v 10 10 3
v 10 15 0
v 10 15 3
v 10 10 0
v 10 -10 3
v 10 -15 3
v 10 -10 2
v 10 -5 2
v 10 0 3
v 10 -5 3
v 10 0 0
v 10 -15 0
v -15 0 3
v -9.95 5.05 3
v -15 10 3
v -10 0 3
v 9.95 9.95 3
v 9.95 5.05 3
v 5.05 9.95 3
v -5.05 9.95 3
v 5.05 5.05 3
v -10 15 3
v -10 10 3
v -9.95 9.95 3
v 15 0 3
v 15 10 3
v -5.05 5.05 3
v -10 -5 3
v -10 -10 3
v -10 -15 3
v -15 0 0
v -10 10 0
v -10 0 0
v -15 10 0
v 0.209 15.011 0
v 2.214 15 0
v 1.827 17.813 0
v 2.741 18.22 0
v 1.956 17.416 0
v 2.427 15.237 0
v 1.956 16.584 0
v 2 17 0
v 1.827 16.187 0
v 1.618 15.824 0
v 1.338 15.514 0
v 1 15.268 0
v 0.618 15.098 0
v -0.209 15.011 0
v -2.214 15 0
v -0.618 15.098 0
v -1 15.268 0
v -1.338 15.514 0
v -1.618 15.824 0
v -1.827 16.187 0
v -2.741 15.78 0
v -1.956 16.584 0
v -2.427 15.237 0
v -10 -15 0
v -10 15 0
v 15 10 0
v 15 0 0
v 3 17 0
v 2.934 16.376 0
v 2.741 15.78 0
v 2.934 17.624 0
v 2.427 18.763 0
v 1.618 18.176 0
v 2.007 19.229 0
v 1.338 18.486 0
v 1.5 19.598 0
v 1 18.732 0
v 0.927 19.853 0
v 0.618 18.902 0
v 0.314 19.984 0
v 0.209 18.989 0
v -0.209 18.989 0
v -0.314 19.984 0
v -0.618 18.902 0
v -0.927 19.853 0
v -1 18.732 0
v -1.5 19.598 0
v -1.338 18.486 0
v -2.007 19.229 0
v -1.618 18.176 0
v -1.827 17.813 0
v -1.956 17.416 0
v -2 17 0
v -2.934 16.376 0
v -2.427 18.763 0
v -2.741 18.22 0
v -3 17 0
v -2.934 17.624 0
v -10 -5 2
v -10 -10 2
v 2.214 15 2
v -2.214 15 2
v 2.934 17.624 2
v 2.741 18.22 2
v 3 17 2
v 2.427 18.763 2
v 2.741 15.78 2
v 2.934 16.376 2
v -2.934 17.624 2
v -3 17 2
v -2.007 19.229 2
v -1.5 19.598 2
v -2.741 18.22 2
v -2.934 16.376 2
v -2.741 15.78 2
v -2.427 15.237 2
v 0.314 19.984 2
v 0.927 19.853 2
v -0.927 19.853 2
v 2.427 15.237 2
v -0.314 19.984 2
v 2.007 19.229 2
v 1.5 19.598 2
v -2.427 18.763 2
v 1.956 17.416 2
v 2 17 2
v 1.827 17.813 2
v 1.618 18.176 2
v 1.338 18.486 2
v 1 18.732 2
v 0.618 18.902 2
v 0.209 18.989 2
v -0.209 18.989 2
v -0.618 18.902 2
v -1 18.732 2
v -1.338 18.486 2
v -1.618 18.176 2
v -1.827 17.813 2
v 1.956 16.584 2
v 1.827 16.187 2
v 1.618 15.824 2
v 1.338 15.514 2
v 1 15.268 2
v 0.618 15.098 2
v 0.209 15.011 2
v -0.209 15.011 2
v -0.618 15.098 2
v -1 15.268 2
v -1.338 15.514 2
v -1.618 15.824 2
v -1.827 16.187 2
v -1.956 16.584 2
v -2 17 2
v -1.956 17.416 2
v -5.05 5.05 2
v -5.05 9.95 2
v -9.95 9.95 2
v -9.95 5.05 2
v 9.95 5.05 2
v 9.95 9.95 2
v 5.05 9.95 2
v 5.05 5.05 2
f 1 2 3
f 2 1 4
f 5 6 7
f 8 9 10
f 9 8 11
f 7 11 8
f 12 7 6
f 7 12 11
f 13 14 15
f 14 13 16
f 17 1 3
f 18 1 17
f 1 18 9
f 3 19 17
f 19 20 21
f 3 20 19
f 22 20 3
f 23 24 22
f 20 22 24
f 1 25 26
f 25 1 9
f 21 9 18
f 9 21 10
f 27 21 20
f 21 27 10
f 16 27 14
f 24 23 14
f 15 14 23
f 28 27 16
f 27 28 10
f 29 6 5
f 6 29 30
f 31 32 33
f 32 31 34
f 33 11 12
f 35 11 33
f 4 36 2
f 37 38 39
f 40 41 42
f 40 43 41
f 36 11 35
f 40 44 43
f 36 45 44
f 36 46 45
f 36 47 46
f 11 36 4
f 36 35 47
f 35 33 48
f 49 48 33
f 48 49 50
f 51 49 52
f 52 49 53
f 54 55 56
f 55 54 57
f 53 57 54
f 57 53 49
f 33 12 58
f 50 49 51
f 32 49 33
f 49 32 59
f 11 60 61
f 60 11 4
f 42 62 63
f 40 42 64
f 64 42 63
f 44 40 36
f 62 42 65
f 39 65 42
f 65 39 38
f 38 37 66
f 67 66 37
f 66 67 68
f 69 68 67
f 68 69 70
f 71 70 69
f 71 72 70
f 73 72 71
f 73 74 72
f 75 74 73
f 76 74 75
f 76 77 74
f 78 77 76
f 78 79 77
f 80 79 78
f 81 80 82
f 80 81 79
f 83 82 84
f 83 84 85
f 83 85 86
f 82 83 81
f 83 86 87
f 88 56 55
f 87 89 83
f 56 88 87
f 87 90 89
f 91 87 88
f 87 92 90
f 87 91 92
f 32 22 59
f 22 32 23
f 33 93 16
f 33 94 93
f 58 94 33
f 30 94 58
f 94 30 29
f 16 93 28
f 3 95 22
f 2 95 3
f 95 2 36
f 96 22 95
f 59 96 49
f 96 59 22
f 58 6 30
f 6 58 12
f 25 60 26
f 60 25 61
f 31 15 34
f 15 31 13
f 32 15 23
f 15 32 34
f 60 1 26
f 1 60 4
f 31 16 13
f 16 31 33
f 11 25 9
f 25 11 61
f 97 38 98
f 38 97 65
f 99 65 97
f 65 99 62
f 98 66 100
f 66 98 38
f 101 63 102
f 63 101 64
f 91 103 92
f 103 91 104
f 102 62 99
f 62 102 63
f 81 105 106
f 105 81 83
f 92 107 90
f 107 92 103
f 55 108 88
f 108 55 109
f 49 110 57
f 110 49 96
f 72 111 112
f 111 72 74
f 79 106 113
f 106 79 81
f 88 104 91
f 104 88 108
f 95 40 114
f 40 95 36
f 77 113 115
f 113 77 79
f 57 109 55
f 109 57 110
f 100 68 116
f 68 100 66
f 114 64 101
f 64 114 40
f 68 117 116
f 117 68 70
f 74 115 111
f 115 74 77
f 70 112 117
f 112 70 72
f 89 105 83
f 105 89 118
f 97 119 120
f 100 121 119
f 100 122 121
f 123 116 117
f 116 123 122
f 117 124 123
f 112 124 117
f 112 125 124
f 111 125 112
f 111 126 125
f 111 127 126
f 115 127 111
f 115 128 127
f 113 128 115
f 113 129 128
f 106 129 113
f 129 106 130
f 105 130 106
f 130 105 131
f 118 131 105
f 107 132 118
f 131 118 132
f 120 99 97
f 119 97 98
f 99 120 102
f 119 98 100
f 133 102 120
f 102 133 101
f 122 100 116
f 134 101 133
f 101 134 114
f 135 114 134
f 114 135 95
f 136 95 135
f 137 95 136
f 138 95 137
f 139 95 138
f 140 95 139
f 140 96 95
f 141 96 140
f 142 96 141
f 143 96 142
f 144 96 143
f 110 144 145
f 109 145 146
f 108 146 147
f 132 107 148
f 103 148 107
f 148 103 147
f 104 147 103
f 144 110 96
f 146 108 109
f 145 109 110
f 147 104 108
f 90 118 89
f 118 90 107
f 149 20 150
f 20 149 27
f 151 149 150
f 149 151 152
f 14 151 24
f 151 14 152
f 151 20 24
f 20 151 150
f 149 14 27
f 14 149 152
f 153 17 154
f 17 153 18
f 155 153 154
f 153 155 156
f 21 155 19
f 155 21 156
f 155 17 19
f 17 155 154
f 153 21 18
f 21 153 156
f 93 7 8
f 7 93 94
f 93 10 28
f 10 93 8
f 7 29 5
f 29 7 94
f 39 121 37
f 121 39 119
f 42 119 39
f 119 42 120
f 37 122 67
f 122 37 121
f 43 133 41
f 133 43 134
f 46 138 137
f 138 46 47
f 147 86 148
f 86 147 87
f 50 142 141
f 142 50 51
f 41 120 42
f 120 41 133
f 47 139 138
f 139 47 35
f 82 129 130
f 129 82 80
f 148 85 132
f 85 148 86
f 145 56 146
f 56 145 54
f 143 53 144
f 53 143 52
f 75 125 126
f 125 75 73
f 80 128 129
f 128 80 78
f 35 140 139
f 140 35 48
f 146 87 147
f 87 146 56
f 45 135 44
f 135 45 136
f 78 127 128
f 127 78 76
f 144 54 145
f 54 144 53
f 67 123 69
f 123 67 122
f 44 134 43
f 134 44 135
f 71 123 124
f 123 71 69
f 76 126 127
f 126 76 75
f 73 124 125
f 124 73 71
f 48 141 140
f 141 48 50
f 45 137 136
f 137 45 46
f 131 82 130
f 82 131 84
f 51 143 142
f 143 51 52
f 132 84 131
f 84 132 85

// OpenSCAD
// darktable keyfob by Kees Guequierre
// Orginal design by Johannes Hanika

unitsize=5;
thickness=3;
holeradius=2;

$fs = 0.01;

difference () {
    union (){
        translate([0,0,thickness/2]) cube([4*unitsize,6*unitsize,thickness],center=true);
        // cheeks
        translate([0,unitsize,thickness/2]) cube([6*unitsize,2*unitsize,thickness],center=true);
        // ringlet
        translate([0,unitsize*3+holeradius,0]) cylinder(h=2*(thickness/3),r=holeradius+1,center=false);
    }
    union(){
        // left eye
        translate([-1.5*unitsize,1.5*unitsize,thickness/2+2*(thickness/3)]) cube([unitsize*0.98,unitsize*0.98,thickness],center=true);
        // right eye
        translate([1.5*unitsize,1.5*unitsize,thickness/2+2*(thickness/3)]) cube([unitsize*0.98,unitsize*0.98,thickness],center=true);
        // mouth
        translate([0,-1.5*unitsize,thickness/2+2*(thickness/3)]) cube([unitsize*4+.2,unitsize,thickness],center=true);
        // ringlet hole
        translate([0,unitsize*3+holeradius,-0.1]) cylinder(h=thickness,r=holeradius,center=false);
    }
}
